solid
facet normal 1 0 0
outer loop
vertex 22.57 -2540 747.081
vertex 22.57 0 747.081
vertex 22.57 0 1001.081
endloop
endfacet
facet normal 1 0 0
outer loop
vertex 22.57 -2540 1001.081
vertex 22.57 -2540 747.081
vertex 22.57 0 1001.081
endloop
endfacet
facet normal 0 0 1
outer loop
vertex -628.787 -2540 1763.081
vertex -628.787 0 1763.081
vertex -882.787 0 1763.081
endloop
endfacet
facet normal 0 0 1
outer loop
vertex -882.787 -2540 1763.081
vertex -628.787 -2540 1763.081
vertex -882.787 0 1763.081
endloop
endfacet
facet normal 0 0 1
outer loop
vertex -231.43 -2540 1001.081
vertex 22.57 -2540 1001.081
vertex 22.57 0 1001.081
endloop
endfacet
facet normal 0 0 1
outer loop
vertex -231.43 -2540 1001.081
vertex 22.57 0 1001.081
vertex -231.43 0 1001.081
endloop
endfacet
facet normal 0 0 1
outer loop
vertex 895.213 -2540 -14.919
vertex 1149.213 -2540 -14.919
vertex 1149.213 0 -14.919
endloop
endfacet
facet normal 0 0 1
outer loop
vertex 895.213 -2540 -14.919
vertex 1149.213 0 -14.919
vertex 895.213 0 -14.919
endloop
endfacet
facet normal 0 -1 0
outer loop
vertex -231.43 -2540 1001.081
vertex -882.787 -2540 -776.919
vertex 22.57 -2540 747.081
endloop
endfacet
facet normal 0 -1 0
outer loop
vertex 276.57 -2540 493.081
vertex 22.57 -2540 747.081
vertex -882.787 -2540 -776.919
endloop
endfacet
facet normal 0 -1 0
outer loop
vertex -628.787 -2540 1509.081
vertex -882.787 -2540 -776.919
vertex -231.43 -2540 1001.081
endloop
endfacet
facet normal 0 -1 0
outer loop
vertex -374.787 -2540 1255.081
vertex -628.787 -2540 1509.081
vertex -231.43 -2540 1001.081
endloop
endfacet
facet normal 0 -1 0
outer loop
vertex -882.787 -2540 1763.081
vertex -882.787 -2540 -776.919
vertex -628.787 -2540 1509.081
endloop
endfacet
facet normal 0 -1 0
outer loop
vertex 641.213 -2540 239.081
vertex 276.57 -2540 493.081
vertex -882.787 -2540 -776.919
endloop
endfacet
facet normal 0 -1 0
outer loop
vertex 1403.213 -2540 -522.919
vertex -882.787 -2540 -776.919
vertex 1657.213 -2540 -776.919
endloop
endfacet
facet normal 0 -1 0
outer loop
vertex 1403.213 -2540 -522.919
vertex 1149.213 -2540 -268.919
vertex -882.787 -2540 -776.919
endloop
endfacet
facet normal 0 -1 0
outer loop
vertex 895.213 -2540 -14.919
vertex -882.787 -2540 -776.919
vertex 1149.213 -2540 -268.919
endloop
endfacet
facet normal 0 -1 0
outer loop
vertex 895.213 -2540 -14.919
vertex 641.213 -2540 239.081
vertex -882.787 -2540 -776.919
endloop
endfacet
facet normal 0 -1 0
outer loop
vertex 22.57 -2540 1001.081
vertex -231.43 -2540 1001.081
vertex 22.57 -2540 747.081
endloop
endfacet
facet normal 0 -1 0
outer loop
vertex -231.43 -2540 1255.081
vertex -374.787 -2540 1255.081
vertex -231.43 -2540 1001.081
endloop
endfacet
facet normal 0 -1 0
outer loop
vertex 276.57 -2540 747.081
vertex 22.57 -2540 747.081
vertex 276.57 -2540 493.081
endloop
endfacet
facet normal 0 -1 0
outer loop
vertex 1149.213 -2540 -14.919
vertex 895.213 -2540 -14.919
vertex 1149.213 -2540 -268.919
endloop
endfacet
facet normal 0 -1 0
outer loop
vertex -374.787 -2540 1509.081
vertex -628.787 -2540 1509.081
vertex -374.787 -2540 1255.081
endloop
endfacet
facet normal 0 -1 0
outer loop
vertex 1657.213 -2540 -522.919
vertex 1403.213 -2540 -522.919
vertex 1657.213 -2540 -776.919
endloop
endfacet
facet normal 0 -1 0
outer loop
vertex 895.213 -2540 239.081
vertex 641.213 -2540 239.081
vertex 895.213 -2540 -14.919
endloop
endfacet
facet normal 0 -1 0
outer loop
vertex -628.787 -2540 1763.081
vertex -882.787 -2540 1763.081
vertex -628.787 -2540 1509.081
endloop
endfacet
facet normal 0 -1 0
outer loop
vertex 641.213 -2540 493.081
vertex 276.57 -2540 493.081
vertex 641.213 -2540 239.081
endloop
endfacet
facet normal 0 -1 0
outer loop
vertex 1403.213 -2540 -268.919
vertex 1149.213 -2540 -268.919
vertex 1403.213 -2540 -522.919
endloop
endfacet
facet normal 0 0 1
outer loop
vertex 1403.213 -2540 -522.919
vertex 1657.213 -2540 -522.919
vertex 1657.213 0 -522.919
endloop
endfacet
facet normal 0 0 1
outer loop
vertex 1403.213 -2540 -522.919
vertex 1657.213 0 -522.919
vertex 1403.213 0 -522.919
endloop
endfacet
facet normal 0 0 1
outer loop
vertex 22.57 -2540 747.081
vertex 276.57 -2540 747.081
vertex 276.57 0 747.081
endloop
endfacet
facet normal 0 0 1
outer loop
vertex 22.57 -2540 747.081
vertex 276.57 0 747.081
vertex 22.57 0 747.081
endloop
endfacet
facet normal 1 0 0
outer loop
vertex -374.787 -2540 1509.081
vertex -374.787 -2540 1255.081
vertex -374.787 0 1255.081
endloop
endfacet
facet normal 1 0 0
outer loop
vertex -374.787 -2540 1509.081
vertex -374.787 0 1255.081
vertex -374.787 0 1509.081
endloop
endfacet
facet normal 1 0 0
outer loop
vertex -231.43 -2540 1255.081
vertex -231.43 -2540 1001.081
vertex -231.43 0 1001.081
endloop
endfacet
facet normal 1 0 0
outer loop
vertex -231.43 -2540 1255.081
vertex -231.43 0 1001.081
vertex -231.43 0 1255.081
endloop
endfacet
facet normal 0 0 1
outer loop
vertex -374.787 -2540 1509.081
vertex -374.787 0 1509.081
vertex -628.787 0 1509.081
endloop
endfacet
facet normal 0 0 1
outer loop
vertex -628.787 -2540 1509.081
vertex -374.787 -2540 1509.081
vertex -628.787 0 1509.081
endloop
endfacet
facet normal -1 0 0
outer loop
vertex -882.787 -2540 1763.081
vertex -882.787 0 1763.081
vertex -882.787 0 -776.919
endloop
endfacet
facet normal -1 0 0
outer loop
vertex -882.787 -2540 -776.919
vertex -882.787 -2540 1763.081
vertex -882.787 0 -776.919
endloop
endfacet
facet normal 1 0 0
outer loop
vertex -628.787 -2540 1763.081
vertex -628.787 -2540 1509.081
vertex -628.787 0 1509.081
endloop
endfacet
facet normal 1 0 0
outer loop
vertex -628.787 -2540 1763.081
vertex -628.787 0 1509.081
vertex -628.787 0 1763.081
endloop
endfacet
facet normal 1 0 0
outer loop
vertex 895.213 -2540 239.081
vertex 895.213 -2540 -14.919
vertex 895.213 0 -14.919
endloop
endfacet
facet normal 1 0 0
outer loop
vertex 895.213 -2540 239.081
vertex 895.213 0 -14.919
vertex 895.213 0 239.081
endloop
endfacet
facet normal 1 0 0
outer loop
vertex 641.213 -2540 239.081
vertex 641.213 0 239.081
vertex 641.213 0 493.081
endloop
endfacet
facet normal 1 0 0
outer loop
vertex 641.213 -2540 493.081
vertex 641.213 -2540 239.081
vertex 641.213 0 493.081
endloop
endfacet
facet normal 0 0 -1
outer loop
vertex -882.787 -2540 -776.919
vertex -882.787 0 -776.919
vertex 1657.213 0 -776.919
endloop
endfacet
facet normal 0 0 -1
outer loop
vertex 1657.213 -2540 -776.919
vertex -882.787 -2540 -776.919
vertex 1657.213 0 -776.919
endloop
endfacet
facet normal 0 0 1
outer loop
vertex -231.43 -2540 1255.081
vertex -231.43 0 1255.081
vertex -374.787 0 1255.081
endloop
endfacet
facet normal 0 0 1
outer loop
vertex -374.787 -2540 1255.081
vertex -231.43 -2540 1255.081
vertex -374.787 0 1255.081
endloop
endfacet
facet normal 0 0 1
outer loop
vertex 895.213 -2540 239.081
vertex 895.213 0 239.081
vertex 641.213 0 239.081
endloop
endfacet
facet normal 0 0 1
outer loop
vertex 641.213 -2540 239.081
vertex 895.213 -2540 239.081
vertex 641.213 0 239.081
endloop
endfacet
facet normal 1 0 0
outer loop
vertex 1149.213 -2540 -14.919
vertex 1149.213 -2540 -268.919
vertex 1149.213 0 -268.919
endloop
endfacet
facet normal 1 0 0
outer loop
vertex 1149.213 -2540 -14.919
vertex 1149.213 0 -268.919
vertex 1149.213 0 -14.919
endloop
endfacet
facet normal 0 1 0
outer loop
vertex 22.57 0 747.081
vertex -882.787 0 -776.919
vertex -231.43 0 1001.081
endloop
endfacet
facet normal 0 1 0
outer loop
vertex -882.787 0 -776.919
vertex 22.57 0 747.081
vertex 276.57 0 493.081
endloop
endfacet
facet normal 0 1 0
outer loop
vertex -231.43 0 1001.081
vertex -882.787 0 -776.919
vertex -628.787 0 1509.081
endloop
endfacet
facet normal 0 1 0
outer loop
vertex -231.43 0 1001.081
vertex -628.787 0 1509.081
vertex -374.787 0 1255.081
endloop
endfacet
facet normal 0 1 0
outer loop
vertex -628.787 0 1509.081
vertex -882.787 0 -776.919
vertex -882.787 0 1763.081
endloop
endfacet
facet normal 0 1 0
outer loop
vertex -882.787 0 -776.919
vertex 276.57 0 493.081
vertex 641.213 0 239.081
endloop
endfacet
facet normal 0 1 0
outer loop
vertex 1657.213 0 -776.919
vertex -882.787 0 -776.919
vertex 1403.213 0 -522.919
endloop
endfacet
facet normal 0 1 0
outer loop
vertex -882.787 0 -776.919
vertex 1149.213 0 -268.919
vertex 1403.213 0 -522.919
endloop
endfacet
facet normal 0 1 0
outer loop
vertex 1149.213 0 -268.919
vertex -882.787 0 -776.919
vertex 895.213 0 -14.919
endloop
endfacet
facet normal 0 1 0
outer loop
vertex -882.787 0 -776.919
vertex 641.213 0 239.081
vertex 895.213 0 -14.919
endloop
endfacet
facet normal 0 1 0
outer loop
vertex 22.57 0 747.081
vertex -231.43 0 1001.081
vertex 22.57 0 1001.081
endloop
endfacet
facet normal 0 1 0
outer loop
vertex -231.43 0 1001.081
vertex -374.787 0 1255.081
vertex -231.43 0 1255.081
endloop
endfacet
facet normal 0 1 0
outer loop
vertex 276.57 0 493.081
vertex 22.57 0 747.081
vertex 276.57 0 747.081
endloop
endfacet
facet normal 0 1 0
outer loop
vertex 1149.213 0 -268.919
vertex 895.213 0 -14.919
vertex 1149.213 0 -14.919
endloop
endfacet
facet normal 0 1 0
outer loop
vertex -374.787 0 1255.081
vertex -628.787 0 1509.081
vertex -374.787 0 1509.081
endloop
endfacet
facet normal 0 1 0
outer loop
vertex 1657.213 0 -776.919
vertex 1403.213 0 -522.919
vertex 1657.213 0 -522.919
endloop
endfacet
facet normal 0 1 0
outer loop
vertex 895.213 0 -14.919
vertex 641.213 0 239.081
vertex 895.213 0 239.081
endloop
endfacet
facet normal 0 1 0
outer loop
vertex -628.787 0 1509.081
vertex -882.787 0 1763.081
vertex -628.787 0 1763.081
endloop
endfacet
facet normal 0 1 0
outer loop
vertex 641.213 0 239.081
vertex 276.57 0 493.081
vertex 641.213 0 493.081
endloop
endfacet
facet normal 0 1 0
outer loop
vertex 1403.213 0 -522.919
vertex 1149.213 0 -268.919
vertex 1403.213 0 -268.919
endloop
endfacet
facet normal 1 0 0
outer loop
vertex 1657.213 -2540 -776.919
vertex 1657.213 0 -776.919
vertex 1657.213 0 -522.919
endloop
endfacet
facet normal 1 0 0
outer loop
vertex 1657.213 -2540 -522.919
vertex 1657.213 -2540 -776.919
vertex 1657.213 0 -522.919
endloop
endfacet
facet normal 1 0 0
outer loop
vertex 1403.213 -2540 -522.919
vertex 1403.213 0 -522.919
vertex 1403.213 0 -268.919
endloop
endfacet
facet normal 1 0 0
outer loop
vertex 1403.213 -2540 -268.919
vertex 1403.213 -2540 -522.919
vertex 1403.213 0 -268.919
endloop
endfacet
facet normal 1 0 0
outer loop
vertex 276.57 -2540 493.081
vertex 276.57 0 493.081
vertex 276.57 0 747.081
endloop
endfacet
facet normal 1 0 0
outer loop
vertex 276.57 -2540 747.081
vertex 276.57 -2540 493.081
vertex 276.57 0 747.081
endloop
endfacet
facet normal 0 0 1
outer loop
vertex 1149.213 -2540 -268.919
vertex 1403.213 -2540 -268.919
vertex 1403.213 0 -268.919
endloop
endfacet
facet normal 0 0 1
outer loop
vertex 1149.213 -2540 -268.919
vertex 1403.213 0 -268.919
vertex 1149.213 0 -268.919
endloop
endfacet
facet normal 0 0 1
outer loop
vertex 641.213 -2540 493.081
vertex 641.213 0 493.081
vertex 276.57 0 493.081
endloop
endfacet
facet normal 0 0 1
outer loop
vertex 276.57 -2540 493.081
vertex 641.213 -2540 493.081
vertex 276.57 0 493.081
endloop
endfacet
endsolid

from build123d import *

# Parameters (mm, degrees)
F1_DEPTH = 2540


with BuildPart() as f1:
    # F0 (on Front) → F1 (new body)
    with BuildSketch(Plane.XZ):
        Polygon((-628.78668, 1763.080694), (-882.78668, 1763.080694), (-882.78668, -776.919306), (1657.21332, -776.919306), (1657.21332, -522.919306), (1403.21332, -522.919306), (1403.21332, -268.919306), (1149.21332, -268.919306), (1149.21332, -14.919306), (895.21332, -14.919306), (895.21332, 239.080694), (641.21332, 239.080694), (641.21332, 493.080694), (276.569884, 493.080694), (276.569884, 747.080694), (22.569884, 747.080694), (22.569884, 1001.080694), (-231.430116, 1001.080694), (-231.430116, 1255.080694), (-374.78668, 1255.080694), (-374.78668, 1509.080694), (-628.78668, 1509.080694), align=None)
    extrude(amount=F1_DEPTH)


solid = f1.part
